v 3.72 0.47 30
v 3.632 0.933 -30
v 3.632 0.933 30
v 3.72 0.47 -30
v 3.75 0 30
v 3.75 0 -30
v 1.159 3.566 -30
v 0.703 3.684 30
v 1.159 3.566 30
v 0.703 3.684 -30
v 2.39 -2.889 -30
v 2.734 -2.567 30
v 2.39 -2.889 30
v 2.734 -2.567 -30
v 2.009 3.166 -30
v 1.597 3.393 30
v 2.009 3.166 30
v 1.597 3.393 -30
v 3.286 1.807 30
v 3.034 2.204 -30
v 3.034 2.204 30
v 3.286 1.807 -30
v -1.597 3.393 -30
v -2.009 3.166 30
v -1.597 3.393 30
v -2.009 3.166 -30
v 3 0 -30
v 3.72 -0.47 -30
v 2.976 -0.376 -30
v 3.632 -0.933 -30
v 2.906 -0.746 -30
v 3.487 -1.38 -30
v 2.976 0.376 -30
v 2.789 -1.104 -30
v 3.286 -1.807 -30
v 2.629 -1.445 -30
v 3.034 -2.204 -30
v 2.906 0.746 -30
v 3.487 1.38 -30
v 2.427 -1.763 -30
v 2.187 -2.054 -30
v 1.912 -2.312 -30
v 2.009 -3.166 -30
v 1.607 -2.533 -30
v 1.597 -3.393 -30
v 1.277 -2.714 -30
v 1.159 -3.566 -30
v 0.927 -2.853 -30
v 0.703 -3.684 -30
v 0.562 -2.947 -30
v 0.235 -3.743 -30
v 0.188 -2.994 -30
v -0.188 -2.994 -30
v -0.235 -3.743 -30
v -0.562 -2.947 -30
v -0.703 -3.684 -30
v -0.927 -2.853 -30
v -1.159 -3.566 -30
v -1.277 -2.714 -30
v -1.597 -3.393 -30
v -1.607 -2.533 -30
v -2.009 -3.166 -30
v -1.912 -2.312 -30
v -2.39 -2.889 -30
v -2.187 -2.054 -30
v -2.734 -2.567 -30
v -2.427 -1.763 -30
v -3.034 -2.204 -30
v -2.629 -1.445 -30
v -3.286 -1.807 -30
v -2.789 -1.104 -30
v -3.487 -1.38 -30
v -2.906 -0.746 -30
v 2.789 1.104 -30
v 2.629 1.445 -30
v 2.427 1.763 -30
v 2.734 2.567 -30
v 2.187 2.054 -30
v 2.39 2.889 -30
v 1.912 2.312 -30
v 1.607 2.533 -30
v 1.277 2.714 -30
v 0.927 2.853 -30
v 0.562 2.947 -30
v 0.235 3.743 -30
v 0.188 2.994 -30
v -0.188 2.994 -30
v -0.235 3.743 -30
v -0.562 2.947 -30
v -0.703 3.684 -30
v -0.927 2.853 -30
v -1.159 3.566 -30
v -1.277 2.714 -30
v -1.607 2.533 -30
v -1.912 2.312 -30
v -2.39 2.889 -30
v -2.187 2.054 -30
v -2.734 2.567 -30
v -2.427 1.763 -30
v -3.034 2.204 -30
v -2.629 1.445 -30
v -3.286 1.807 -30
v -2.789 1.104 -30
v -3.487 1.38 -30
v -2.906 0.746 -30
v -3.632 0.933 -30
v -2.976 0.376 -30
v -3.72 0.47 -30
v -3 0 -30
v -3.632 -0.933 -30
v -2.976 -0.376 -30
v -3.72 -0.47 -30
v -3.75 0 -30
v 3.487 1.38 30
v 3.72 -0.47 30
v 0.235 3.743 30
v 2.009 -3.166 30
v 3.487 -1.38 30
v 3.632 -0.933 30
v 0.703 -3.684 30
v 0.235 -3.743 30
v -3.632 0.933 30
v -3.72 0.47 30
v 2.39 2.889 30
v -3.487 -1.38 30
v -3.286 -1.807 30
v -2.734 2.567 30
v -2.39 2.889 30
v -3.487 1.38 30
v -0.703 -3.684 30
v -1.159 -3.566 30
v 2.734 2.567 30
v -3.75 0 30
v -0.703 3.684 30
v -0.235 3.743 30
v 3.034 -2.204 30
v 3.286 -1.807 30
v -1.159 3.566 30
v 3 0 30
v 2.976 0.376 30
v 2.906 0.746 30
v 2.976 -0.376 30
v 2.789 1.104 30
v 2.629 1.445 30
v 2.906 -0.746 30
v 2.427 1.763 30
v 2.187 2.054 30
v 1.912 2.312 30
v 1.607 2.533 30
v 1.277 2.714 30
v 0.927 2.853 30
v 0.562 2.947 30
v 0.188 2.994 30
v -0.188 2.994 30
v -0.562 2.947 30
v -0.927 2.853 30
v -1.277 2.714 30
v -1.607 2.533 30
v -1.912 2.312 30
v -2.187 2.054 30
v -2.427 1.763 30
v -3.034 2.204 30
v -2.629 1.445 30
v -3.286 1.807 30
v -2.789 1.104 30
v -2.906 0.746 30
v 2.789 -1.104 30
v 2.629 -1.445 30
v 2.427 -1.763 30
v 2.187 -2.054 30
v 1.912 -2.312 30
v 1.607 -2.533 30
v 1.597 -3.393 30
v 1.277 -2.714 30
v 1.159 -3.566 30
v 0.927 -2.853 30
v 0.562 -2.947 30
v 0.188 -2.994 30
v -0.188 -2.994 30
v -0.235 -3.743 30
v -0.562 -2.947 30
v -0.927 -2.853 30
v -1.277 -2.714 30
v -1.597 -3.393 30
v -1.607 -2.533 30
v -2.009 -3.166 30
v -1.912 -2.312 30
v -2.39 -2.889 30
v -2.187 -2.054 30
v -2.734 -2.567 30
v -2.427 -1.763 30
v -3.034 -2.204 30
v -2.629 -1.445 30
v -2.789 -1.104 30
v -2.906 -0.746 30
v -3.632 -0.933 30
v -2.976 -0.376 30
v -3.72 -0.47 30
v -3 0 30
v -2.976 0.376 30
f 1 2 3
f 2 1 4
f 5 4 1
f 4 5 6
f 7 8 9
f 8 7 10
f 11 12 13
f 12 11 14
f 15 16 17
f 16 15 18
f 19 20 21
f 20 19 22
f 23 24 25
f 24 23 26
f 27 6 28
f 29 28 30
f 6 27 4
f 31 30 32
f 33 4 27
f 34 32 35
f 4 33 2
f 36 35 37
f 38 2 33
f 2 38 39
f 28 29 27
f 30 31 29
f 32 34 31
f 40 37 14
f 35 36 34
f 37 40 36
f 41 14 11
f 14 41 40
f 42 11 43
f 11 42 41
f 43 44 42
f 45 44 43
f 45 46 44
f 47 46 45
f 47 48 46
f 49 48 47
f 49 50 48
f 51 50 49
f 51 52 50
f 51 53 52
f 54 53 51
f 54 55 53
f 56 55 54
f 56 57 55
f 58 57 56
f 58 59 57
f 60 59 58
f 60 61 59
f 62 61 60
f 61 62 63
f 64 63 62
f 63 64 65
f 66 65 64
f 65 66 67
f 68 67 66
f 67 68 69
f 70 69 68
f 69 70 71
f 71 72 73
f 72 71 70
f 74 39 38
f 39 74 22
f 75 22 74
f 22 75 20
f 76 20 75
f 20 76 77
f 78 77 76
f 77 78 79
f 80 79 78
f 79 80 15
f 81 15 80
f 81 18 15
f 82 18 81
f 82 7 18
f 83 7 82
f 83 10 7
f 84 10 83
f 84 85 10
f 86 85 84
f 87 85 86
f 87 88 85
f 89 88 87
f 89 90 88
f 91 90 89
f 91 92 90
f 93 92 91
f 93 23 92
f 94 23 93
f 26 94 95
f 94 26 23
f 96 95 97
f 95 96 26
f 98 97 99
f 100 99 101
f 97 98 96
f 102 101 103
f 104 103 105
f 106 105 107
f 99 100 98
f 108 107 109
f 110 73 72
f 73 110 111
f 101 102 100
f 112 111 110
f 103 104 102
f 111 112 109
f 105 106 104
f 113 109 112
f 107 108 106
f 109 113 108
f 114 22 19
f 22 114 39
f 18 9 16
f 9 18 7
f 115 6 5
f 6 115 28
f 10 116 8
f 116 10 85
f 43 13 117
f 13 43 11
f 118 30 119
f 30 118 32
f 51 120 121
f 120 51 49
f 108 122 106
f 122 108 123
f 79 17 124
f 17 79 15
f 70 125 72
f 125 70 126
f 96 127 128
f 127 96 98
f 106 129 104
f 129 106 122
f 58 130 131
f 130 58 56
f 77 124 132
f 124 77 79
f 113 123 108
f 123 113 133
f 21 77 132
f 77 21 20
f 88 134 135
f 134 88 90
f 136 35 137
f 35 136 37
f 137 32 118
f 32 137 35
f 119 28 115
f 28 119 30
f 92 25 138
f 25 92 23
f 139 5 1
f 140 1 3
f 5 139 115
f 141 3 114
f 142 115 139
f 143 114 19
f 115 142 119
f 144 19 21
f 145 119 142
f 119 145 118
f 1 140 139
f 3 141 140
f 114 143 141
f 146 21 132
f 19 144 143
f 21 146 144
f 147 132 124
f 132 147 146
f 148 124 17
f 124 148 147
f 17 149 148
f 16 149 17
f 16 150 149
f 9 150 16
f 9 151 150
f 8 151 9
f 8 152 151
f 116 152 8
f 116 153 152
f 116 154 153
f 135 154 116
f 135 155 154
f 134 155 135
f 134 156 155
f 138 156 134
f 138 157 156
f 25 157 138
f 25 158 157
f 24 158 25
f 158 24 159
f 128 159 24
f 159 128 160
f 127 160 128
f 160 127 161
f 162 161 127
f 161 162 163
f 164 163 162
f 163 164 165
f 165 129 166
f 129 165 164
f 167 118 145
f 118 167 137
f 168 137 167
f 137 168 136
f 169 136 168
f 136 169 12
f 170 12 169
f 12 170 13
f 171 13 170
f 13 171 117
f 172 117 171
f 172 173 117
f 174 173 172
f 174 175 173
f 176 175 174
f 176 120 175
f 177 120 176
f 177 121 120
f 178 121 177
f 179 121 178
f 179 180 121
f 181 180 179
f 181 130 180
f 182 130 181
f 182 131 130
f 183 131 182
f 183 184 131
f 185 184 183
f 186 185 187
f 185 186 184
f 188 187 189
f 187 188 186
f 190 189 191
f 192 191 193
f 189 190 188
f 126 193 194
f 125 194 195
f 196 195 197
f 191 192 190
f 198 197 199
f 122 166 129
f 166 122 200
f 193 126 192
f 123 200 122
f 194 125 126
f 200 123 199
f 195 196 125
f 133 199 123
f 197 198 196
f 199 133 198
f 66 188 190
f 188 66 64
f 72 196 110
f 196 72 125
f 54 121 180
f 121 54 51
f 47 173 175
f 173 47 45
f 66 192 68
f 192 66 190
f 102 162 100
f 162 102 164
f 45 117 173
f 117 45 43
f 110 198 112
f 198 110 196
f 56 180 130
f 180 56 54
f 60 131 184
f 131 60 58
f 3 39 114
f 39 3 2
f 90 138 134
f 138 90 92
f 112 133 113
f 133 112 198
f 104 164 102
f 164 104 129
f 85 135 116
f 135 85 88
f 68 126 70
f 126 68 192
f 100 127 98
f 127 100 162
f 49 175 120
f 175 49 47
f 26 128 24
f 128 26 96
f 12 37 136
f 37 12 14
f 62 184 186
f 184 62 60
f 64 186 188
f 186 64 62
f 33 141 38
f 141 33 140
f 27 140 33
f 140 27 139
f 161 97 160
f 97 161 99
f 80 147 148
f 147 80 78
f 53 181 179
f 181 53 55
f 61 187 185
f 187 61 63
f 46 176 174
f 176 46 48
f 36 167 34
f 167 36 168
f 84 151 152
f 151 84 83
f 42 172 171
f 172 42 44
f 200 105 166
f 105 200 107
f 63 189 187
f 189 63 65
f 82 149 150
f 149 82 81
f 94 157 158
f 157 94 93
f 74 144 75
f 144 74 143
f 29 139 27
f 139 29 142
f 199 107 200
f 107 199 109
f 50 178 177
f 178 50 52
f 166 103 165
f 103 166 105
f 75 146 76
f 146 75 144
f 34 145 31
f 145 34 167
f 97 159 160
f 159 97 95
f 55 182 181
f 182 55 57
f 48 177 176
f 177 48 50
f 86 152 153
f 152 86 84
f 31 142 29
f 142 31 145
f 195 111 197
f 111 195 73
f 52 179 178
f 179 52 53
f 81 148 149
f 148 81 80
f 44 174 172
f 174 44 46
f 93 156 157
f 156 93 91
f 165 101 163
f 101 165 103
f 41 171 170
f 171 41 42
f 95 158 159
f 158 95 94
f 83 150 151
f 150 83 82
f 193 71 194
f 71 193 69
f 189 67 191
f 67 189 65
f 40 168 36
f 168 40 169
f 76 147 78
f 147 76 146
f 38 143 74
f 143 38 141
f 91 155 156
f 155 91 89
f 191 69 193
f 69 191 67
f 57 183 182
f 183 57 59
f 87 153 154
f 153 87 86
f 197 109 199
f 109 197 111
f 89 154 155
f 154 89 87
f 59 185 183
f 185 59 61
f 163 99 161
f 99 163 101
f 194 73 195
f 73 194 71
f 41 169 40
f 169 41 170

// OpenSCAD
$fn = 50;


difference() {
	union() {
		translate(v = [0, 0, -30.0000000000]) {
			cylinder(h = 60, r = 3.7500000000);
		}
	}
	union() {
		translate(v = [0, 0, -100.0000000000]) {
			cylinder(h = 200, r = 3.0000000000);
		}
	}
}
